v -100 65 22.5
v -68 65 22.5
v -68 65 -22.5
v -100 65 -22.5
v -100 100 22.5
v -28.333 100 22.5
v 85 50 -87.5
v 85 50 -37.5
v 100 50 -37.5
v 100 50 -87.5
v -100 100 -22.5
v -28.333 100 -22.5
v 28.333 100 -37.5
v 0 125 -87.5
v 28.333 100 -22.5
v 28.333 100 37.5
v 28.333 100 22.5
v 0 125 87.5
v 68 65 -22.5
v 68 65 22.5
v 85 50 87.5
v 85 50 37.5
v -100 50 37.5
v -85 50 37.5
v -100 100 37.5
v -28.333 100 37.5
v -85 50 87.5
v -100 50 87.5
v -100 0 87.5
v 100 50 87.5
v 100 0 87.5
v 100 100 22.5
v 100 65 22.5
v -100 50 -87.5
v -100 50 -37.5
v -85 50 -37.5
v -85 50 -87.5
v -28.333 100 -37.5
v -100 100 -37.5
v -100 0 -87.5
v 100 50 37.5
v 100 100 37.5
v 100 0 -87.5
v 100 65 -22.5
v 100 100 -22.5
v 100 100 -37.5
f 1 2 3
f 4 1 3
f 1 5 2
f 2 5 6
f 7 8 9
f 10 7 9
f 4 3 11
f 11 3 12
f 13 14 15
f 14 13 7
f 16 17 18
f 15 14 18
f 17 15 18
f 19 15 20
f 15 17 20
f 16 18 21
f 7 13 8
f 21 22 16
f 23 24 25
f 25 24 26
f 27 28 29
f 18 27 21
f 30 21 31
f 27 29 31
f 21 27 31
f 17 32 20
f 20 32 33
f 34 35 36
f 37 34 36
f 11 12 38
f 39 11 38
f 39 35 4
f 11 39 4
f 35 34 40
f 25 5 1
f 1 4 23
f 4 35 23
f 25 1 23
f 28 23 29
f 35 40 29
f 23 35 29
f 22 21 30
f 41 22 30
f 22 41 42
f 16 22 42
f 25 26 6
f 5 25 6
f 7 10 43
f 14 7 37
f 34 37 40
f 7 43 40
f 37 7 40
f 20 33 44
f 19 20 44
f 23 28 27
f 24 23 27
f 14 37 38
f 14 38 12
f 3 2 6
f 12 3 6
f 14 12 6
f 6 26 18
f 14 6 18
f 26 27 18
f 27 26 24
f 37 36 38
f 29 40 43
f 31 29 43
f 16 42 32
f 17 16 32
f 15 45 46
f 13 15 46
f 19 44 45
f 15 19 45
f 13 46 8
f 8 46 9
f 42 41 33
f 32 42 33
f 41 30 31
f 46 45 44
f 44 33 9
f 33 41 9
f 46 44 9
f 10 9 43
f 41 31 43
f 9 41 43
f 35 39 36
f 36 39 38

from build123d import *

# Parameters (mm, degrees)
SKETCH1_W           = 30
SKETCH1_H           = 45
SKETCH1_W_2         = 15
SKETCH1_H_2         = 50
BOSS_EXTRUDE3_DEPTH = 50
BOSS_EXTRUDE4_DEPTH = 175
BOSS_EXTRUDE6_DEPTH = 100


with BuildPart() as part:
    # Sketch1 → Boss-Extrude3 (new body)
    with BuildSketch(Plane(origin=(0, 0, 0), x_dir=(1, 0, 0), z_dir=(0, 1, 0))):
        Polygon((85, 87.5), (-85, 87.5), (-85, 37.5), (-70, 37.5), (-35, 37.5), (-35, 22.5), (-70, 22.5), (-70, -22.5), (-35, -22.5), (-35, -37.5), (-85, -37.5), (-85, -87.5), (85, -87.5), (85, -37.5), (35, -37.5), (35, -22.5), (70, -22.5), (70, 22.5), (35, 22.5), (35, 37.5), (70, 37.5), (85, 37.5), align=None)
        with Locations((-85, 0)):
            Rectangle(SKETCH1_W, SKETCH1_H)
        with Locations((-92.5, 62.5)):
            Rectangle(SKETCH1_W_2, SKETCH1_H_2)
        Polygon((-85, 37.5), (-100, 37.5), (-100, 22.5), (-70, 22.5), (-35, 22.5), (-35, 37.5), (-70, 37.5), align=None)
        Polygon((-70, -22.5), (-100, -22.5), (-100, -37.5), (-85, -37.5), (-35, -37.5), (-35, -22.5), align=None)
        with Locations((-92.5, -62.5)):
            Rectangle(SKETCH1_W_2, SKETCH1_H_2)
        with Locations((92.5, 62.5)):
            Rectangle(SKETCH1_W_2, SKETCH1_H_2)
        Polygon((100, 37.5), (85, 37.5), (70, 37.5), (35, 37.5), (35, 22.5), (70, 22.5), (100, 22.5), align=None)
        with Locations((85, 0)):
            Rectangle(SKETCH1_W, SKETCH1_H)
        Polygon((100, -37.5), (100, -22.5), (70, -22.5), (35, -22.5), (35, -37.5), (85, -37.5), align=None)
        with Locations((92.5, -62.5)):
            Rectangle(SKETCH1_W_2, SKETCH1_H_2)
    extrude(amount=BOSS_EXTRUDE3_DEPTH)

    # Sketch5 → Boss-Extrude4 (add)
    with BuildSketch(Plane.XY.offset(87.5)):
        Polygon((-100, 50), (-85, 50), (0, 125), (85, 50), (100, 50), (100, 0), (-100, 0), align=None)
    extrude(amount=-BOSS_EXTRUDE4_DEPTH)

    # Sketch18 → Boss-Extrude6 (add, symmetric)
    with BuildSketch(Plane(origin=(0, 0, 0), x_dir=(0, 0, -1), z_dir=(1, 0, 0))):
        Polygon((-87.5, 50), (-37.5, 50), (-37.5, 100), (-22.5, 100), (-22.5, 65), (22.5, 65), (22.5, 100), (37.5, 100), (37.5, 50), (87.5, 50), (87.5, 0), (-87.5, 0), align=None)
    extrude(amount=BOSS_EXTRUDE6_DEPTH, both=True)


solid = part.part
